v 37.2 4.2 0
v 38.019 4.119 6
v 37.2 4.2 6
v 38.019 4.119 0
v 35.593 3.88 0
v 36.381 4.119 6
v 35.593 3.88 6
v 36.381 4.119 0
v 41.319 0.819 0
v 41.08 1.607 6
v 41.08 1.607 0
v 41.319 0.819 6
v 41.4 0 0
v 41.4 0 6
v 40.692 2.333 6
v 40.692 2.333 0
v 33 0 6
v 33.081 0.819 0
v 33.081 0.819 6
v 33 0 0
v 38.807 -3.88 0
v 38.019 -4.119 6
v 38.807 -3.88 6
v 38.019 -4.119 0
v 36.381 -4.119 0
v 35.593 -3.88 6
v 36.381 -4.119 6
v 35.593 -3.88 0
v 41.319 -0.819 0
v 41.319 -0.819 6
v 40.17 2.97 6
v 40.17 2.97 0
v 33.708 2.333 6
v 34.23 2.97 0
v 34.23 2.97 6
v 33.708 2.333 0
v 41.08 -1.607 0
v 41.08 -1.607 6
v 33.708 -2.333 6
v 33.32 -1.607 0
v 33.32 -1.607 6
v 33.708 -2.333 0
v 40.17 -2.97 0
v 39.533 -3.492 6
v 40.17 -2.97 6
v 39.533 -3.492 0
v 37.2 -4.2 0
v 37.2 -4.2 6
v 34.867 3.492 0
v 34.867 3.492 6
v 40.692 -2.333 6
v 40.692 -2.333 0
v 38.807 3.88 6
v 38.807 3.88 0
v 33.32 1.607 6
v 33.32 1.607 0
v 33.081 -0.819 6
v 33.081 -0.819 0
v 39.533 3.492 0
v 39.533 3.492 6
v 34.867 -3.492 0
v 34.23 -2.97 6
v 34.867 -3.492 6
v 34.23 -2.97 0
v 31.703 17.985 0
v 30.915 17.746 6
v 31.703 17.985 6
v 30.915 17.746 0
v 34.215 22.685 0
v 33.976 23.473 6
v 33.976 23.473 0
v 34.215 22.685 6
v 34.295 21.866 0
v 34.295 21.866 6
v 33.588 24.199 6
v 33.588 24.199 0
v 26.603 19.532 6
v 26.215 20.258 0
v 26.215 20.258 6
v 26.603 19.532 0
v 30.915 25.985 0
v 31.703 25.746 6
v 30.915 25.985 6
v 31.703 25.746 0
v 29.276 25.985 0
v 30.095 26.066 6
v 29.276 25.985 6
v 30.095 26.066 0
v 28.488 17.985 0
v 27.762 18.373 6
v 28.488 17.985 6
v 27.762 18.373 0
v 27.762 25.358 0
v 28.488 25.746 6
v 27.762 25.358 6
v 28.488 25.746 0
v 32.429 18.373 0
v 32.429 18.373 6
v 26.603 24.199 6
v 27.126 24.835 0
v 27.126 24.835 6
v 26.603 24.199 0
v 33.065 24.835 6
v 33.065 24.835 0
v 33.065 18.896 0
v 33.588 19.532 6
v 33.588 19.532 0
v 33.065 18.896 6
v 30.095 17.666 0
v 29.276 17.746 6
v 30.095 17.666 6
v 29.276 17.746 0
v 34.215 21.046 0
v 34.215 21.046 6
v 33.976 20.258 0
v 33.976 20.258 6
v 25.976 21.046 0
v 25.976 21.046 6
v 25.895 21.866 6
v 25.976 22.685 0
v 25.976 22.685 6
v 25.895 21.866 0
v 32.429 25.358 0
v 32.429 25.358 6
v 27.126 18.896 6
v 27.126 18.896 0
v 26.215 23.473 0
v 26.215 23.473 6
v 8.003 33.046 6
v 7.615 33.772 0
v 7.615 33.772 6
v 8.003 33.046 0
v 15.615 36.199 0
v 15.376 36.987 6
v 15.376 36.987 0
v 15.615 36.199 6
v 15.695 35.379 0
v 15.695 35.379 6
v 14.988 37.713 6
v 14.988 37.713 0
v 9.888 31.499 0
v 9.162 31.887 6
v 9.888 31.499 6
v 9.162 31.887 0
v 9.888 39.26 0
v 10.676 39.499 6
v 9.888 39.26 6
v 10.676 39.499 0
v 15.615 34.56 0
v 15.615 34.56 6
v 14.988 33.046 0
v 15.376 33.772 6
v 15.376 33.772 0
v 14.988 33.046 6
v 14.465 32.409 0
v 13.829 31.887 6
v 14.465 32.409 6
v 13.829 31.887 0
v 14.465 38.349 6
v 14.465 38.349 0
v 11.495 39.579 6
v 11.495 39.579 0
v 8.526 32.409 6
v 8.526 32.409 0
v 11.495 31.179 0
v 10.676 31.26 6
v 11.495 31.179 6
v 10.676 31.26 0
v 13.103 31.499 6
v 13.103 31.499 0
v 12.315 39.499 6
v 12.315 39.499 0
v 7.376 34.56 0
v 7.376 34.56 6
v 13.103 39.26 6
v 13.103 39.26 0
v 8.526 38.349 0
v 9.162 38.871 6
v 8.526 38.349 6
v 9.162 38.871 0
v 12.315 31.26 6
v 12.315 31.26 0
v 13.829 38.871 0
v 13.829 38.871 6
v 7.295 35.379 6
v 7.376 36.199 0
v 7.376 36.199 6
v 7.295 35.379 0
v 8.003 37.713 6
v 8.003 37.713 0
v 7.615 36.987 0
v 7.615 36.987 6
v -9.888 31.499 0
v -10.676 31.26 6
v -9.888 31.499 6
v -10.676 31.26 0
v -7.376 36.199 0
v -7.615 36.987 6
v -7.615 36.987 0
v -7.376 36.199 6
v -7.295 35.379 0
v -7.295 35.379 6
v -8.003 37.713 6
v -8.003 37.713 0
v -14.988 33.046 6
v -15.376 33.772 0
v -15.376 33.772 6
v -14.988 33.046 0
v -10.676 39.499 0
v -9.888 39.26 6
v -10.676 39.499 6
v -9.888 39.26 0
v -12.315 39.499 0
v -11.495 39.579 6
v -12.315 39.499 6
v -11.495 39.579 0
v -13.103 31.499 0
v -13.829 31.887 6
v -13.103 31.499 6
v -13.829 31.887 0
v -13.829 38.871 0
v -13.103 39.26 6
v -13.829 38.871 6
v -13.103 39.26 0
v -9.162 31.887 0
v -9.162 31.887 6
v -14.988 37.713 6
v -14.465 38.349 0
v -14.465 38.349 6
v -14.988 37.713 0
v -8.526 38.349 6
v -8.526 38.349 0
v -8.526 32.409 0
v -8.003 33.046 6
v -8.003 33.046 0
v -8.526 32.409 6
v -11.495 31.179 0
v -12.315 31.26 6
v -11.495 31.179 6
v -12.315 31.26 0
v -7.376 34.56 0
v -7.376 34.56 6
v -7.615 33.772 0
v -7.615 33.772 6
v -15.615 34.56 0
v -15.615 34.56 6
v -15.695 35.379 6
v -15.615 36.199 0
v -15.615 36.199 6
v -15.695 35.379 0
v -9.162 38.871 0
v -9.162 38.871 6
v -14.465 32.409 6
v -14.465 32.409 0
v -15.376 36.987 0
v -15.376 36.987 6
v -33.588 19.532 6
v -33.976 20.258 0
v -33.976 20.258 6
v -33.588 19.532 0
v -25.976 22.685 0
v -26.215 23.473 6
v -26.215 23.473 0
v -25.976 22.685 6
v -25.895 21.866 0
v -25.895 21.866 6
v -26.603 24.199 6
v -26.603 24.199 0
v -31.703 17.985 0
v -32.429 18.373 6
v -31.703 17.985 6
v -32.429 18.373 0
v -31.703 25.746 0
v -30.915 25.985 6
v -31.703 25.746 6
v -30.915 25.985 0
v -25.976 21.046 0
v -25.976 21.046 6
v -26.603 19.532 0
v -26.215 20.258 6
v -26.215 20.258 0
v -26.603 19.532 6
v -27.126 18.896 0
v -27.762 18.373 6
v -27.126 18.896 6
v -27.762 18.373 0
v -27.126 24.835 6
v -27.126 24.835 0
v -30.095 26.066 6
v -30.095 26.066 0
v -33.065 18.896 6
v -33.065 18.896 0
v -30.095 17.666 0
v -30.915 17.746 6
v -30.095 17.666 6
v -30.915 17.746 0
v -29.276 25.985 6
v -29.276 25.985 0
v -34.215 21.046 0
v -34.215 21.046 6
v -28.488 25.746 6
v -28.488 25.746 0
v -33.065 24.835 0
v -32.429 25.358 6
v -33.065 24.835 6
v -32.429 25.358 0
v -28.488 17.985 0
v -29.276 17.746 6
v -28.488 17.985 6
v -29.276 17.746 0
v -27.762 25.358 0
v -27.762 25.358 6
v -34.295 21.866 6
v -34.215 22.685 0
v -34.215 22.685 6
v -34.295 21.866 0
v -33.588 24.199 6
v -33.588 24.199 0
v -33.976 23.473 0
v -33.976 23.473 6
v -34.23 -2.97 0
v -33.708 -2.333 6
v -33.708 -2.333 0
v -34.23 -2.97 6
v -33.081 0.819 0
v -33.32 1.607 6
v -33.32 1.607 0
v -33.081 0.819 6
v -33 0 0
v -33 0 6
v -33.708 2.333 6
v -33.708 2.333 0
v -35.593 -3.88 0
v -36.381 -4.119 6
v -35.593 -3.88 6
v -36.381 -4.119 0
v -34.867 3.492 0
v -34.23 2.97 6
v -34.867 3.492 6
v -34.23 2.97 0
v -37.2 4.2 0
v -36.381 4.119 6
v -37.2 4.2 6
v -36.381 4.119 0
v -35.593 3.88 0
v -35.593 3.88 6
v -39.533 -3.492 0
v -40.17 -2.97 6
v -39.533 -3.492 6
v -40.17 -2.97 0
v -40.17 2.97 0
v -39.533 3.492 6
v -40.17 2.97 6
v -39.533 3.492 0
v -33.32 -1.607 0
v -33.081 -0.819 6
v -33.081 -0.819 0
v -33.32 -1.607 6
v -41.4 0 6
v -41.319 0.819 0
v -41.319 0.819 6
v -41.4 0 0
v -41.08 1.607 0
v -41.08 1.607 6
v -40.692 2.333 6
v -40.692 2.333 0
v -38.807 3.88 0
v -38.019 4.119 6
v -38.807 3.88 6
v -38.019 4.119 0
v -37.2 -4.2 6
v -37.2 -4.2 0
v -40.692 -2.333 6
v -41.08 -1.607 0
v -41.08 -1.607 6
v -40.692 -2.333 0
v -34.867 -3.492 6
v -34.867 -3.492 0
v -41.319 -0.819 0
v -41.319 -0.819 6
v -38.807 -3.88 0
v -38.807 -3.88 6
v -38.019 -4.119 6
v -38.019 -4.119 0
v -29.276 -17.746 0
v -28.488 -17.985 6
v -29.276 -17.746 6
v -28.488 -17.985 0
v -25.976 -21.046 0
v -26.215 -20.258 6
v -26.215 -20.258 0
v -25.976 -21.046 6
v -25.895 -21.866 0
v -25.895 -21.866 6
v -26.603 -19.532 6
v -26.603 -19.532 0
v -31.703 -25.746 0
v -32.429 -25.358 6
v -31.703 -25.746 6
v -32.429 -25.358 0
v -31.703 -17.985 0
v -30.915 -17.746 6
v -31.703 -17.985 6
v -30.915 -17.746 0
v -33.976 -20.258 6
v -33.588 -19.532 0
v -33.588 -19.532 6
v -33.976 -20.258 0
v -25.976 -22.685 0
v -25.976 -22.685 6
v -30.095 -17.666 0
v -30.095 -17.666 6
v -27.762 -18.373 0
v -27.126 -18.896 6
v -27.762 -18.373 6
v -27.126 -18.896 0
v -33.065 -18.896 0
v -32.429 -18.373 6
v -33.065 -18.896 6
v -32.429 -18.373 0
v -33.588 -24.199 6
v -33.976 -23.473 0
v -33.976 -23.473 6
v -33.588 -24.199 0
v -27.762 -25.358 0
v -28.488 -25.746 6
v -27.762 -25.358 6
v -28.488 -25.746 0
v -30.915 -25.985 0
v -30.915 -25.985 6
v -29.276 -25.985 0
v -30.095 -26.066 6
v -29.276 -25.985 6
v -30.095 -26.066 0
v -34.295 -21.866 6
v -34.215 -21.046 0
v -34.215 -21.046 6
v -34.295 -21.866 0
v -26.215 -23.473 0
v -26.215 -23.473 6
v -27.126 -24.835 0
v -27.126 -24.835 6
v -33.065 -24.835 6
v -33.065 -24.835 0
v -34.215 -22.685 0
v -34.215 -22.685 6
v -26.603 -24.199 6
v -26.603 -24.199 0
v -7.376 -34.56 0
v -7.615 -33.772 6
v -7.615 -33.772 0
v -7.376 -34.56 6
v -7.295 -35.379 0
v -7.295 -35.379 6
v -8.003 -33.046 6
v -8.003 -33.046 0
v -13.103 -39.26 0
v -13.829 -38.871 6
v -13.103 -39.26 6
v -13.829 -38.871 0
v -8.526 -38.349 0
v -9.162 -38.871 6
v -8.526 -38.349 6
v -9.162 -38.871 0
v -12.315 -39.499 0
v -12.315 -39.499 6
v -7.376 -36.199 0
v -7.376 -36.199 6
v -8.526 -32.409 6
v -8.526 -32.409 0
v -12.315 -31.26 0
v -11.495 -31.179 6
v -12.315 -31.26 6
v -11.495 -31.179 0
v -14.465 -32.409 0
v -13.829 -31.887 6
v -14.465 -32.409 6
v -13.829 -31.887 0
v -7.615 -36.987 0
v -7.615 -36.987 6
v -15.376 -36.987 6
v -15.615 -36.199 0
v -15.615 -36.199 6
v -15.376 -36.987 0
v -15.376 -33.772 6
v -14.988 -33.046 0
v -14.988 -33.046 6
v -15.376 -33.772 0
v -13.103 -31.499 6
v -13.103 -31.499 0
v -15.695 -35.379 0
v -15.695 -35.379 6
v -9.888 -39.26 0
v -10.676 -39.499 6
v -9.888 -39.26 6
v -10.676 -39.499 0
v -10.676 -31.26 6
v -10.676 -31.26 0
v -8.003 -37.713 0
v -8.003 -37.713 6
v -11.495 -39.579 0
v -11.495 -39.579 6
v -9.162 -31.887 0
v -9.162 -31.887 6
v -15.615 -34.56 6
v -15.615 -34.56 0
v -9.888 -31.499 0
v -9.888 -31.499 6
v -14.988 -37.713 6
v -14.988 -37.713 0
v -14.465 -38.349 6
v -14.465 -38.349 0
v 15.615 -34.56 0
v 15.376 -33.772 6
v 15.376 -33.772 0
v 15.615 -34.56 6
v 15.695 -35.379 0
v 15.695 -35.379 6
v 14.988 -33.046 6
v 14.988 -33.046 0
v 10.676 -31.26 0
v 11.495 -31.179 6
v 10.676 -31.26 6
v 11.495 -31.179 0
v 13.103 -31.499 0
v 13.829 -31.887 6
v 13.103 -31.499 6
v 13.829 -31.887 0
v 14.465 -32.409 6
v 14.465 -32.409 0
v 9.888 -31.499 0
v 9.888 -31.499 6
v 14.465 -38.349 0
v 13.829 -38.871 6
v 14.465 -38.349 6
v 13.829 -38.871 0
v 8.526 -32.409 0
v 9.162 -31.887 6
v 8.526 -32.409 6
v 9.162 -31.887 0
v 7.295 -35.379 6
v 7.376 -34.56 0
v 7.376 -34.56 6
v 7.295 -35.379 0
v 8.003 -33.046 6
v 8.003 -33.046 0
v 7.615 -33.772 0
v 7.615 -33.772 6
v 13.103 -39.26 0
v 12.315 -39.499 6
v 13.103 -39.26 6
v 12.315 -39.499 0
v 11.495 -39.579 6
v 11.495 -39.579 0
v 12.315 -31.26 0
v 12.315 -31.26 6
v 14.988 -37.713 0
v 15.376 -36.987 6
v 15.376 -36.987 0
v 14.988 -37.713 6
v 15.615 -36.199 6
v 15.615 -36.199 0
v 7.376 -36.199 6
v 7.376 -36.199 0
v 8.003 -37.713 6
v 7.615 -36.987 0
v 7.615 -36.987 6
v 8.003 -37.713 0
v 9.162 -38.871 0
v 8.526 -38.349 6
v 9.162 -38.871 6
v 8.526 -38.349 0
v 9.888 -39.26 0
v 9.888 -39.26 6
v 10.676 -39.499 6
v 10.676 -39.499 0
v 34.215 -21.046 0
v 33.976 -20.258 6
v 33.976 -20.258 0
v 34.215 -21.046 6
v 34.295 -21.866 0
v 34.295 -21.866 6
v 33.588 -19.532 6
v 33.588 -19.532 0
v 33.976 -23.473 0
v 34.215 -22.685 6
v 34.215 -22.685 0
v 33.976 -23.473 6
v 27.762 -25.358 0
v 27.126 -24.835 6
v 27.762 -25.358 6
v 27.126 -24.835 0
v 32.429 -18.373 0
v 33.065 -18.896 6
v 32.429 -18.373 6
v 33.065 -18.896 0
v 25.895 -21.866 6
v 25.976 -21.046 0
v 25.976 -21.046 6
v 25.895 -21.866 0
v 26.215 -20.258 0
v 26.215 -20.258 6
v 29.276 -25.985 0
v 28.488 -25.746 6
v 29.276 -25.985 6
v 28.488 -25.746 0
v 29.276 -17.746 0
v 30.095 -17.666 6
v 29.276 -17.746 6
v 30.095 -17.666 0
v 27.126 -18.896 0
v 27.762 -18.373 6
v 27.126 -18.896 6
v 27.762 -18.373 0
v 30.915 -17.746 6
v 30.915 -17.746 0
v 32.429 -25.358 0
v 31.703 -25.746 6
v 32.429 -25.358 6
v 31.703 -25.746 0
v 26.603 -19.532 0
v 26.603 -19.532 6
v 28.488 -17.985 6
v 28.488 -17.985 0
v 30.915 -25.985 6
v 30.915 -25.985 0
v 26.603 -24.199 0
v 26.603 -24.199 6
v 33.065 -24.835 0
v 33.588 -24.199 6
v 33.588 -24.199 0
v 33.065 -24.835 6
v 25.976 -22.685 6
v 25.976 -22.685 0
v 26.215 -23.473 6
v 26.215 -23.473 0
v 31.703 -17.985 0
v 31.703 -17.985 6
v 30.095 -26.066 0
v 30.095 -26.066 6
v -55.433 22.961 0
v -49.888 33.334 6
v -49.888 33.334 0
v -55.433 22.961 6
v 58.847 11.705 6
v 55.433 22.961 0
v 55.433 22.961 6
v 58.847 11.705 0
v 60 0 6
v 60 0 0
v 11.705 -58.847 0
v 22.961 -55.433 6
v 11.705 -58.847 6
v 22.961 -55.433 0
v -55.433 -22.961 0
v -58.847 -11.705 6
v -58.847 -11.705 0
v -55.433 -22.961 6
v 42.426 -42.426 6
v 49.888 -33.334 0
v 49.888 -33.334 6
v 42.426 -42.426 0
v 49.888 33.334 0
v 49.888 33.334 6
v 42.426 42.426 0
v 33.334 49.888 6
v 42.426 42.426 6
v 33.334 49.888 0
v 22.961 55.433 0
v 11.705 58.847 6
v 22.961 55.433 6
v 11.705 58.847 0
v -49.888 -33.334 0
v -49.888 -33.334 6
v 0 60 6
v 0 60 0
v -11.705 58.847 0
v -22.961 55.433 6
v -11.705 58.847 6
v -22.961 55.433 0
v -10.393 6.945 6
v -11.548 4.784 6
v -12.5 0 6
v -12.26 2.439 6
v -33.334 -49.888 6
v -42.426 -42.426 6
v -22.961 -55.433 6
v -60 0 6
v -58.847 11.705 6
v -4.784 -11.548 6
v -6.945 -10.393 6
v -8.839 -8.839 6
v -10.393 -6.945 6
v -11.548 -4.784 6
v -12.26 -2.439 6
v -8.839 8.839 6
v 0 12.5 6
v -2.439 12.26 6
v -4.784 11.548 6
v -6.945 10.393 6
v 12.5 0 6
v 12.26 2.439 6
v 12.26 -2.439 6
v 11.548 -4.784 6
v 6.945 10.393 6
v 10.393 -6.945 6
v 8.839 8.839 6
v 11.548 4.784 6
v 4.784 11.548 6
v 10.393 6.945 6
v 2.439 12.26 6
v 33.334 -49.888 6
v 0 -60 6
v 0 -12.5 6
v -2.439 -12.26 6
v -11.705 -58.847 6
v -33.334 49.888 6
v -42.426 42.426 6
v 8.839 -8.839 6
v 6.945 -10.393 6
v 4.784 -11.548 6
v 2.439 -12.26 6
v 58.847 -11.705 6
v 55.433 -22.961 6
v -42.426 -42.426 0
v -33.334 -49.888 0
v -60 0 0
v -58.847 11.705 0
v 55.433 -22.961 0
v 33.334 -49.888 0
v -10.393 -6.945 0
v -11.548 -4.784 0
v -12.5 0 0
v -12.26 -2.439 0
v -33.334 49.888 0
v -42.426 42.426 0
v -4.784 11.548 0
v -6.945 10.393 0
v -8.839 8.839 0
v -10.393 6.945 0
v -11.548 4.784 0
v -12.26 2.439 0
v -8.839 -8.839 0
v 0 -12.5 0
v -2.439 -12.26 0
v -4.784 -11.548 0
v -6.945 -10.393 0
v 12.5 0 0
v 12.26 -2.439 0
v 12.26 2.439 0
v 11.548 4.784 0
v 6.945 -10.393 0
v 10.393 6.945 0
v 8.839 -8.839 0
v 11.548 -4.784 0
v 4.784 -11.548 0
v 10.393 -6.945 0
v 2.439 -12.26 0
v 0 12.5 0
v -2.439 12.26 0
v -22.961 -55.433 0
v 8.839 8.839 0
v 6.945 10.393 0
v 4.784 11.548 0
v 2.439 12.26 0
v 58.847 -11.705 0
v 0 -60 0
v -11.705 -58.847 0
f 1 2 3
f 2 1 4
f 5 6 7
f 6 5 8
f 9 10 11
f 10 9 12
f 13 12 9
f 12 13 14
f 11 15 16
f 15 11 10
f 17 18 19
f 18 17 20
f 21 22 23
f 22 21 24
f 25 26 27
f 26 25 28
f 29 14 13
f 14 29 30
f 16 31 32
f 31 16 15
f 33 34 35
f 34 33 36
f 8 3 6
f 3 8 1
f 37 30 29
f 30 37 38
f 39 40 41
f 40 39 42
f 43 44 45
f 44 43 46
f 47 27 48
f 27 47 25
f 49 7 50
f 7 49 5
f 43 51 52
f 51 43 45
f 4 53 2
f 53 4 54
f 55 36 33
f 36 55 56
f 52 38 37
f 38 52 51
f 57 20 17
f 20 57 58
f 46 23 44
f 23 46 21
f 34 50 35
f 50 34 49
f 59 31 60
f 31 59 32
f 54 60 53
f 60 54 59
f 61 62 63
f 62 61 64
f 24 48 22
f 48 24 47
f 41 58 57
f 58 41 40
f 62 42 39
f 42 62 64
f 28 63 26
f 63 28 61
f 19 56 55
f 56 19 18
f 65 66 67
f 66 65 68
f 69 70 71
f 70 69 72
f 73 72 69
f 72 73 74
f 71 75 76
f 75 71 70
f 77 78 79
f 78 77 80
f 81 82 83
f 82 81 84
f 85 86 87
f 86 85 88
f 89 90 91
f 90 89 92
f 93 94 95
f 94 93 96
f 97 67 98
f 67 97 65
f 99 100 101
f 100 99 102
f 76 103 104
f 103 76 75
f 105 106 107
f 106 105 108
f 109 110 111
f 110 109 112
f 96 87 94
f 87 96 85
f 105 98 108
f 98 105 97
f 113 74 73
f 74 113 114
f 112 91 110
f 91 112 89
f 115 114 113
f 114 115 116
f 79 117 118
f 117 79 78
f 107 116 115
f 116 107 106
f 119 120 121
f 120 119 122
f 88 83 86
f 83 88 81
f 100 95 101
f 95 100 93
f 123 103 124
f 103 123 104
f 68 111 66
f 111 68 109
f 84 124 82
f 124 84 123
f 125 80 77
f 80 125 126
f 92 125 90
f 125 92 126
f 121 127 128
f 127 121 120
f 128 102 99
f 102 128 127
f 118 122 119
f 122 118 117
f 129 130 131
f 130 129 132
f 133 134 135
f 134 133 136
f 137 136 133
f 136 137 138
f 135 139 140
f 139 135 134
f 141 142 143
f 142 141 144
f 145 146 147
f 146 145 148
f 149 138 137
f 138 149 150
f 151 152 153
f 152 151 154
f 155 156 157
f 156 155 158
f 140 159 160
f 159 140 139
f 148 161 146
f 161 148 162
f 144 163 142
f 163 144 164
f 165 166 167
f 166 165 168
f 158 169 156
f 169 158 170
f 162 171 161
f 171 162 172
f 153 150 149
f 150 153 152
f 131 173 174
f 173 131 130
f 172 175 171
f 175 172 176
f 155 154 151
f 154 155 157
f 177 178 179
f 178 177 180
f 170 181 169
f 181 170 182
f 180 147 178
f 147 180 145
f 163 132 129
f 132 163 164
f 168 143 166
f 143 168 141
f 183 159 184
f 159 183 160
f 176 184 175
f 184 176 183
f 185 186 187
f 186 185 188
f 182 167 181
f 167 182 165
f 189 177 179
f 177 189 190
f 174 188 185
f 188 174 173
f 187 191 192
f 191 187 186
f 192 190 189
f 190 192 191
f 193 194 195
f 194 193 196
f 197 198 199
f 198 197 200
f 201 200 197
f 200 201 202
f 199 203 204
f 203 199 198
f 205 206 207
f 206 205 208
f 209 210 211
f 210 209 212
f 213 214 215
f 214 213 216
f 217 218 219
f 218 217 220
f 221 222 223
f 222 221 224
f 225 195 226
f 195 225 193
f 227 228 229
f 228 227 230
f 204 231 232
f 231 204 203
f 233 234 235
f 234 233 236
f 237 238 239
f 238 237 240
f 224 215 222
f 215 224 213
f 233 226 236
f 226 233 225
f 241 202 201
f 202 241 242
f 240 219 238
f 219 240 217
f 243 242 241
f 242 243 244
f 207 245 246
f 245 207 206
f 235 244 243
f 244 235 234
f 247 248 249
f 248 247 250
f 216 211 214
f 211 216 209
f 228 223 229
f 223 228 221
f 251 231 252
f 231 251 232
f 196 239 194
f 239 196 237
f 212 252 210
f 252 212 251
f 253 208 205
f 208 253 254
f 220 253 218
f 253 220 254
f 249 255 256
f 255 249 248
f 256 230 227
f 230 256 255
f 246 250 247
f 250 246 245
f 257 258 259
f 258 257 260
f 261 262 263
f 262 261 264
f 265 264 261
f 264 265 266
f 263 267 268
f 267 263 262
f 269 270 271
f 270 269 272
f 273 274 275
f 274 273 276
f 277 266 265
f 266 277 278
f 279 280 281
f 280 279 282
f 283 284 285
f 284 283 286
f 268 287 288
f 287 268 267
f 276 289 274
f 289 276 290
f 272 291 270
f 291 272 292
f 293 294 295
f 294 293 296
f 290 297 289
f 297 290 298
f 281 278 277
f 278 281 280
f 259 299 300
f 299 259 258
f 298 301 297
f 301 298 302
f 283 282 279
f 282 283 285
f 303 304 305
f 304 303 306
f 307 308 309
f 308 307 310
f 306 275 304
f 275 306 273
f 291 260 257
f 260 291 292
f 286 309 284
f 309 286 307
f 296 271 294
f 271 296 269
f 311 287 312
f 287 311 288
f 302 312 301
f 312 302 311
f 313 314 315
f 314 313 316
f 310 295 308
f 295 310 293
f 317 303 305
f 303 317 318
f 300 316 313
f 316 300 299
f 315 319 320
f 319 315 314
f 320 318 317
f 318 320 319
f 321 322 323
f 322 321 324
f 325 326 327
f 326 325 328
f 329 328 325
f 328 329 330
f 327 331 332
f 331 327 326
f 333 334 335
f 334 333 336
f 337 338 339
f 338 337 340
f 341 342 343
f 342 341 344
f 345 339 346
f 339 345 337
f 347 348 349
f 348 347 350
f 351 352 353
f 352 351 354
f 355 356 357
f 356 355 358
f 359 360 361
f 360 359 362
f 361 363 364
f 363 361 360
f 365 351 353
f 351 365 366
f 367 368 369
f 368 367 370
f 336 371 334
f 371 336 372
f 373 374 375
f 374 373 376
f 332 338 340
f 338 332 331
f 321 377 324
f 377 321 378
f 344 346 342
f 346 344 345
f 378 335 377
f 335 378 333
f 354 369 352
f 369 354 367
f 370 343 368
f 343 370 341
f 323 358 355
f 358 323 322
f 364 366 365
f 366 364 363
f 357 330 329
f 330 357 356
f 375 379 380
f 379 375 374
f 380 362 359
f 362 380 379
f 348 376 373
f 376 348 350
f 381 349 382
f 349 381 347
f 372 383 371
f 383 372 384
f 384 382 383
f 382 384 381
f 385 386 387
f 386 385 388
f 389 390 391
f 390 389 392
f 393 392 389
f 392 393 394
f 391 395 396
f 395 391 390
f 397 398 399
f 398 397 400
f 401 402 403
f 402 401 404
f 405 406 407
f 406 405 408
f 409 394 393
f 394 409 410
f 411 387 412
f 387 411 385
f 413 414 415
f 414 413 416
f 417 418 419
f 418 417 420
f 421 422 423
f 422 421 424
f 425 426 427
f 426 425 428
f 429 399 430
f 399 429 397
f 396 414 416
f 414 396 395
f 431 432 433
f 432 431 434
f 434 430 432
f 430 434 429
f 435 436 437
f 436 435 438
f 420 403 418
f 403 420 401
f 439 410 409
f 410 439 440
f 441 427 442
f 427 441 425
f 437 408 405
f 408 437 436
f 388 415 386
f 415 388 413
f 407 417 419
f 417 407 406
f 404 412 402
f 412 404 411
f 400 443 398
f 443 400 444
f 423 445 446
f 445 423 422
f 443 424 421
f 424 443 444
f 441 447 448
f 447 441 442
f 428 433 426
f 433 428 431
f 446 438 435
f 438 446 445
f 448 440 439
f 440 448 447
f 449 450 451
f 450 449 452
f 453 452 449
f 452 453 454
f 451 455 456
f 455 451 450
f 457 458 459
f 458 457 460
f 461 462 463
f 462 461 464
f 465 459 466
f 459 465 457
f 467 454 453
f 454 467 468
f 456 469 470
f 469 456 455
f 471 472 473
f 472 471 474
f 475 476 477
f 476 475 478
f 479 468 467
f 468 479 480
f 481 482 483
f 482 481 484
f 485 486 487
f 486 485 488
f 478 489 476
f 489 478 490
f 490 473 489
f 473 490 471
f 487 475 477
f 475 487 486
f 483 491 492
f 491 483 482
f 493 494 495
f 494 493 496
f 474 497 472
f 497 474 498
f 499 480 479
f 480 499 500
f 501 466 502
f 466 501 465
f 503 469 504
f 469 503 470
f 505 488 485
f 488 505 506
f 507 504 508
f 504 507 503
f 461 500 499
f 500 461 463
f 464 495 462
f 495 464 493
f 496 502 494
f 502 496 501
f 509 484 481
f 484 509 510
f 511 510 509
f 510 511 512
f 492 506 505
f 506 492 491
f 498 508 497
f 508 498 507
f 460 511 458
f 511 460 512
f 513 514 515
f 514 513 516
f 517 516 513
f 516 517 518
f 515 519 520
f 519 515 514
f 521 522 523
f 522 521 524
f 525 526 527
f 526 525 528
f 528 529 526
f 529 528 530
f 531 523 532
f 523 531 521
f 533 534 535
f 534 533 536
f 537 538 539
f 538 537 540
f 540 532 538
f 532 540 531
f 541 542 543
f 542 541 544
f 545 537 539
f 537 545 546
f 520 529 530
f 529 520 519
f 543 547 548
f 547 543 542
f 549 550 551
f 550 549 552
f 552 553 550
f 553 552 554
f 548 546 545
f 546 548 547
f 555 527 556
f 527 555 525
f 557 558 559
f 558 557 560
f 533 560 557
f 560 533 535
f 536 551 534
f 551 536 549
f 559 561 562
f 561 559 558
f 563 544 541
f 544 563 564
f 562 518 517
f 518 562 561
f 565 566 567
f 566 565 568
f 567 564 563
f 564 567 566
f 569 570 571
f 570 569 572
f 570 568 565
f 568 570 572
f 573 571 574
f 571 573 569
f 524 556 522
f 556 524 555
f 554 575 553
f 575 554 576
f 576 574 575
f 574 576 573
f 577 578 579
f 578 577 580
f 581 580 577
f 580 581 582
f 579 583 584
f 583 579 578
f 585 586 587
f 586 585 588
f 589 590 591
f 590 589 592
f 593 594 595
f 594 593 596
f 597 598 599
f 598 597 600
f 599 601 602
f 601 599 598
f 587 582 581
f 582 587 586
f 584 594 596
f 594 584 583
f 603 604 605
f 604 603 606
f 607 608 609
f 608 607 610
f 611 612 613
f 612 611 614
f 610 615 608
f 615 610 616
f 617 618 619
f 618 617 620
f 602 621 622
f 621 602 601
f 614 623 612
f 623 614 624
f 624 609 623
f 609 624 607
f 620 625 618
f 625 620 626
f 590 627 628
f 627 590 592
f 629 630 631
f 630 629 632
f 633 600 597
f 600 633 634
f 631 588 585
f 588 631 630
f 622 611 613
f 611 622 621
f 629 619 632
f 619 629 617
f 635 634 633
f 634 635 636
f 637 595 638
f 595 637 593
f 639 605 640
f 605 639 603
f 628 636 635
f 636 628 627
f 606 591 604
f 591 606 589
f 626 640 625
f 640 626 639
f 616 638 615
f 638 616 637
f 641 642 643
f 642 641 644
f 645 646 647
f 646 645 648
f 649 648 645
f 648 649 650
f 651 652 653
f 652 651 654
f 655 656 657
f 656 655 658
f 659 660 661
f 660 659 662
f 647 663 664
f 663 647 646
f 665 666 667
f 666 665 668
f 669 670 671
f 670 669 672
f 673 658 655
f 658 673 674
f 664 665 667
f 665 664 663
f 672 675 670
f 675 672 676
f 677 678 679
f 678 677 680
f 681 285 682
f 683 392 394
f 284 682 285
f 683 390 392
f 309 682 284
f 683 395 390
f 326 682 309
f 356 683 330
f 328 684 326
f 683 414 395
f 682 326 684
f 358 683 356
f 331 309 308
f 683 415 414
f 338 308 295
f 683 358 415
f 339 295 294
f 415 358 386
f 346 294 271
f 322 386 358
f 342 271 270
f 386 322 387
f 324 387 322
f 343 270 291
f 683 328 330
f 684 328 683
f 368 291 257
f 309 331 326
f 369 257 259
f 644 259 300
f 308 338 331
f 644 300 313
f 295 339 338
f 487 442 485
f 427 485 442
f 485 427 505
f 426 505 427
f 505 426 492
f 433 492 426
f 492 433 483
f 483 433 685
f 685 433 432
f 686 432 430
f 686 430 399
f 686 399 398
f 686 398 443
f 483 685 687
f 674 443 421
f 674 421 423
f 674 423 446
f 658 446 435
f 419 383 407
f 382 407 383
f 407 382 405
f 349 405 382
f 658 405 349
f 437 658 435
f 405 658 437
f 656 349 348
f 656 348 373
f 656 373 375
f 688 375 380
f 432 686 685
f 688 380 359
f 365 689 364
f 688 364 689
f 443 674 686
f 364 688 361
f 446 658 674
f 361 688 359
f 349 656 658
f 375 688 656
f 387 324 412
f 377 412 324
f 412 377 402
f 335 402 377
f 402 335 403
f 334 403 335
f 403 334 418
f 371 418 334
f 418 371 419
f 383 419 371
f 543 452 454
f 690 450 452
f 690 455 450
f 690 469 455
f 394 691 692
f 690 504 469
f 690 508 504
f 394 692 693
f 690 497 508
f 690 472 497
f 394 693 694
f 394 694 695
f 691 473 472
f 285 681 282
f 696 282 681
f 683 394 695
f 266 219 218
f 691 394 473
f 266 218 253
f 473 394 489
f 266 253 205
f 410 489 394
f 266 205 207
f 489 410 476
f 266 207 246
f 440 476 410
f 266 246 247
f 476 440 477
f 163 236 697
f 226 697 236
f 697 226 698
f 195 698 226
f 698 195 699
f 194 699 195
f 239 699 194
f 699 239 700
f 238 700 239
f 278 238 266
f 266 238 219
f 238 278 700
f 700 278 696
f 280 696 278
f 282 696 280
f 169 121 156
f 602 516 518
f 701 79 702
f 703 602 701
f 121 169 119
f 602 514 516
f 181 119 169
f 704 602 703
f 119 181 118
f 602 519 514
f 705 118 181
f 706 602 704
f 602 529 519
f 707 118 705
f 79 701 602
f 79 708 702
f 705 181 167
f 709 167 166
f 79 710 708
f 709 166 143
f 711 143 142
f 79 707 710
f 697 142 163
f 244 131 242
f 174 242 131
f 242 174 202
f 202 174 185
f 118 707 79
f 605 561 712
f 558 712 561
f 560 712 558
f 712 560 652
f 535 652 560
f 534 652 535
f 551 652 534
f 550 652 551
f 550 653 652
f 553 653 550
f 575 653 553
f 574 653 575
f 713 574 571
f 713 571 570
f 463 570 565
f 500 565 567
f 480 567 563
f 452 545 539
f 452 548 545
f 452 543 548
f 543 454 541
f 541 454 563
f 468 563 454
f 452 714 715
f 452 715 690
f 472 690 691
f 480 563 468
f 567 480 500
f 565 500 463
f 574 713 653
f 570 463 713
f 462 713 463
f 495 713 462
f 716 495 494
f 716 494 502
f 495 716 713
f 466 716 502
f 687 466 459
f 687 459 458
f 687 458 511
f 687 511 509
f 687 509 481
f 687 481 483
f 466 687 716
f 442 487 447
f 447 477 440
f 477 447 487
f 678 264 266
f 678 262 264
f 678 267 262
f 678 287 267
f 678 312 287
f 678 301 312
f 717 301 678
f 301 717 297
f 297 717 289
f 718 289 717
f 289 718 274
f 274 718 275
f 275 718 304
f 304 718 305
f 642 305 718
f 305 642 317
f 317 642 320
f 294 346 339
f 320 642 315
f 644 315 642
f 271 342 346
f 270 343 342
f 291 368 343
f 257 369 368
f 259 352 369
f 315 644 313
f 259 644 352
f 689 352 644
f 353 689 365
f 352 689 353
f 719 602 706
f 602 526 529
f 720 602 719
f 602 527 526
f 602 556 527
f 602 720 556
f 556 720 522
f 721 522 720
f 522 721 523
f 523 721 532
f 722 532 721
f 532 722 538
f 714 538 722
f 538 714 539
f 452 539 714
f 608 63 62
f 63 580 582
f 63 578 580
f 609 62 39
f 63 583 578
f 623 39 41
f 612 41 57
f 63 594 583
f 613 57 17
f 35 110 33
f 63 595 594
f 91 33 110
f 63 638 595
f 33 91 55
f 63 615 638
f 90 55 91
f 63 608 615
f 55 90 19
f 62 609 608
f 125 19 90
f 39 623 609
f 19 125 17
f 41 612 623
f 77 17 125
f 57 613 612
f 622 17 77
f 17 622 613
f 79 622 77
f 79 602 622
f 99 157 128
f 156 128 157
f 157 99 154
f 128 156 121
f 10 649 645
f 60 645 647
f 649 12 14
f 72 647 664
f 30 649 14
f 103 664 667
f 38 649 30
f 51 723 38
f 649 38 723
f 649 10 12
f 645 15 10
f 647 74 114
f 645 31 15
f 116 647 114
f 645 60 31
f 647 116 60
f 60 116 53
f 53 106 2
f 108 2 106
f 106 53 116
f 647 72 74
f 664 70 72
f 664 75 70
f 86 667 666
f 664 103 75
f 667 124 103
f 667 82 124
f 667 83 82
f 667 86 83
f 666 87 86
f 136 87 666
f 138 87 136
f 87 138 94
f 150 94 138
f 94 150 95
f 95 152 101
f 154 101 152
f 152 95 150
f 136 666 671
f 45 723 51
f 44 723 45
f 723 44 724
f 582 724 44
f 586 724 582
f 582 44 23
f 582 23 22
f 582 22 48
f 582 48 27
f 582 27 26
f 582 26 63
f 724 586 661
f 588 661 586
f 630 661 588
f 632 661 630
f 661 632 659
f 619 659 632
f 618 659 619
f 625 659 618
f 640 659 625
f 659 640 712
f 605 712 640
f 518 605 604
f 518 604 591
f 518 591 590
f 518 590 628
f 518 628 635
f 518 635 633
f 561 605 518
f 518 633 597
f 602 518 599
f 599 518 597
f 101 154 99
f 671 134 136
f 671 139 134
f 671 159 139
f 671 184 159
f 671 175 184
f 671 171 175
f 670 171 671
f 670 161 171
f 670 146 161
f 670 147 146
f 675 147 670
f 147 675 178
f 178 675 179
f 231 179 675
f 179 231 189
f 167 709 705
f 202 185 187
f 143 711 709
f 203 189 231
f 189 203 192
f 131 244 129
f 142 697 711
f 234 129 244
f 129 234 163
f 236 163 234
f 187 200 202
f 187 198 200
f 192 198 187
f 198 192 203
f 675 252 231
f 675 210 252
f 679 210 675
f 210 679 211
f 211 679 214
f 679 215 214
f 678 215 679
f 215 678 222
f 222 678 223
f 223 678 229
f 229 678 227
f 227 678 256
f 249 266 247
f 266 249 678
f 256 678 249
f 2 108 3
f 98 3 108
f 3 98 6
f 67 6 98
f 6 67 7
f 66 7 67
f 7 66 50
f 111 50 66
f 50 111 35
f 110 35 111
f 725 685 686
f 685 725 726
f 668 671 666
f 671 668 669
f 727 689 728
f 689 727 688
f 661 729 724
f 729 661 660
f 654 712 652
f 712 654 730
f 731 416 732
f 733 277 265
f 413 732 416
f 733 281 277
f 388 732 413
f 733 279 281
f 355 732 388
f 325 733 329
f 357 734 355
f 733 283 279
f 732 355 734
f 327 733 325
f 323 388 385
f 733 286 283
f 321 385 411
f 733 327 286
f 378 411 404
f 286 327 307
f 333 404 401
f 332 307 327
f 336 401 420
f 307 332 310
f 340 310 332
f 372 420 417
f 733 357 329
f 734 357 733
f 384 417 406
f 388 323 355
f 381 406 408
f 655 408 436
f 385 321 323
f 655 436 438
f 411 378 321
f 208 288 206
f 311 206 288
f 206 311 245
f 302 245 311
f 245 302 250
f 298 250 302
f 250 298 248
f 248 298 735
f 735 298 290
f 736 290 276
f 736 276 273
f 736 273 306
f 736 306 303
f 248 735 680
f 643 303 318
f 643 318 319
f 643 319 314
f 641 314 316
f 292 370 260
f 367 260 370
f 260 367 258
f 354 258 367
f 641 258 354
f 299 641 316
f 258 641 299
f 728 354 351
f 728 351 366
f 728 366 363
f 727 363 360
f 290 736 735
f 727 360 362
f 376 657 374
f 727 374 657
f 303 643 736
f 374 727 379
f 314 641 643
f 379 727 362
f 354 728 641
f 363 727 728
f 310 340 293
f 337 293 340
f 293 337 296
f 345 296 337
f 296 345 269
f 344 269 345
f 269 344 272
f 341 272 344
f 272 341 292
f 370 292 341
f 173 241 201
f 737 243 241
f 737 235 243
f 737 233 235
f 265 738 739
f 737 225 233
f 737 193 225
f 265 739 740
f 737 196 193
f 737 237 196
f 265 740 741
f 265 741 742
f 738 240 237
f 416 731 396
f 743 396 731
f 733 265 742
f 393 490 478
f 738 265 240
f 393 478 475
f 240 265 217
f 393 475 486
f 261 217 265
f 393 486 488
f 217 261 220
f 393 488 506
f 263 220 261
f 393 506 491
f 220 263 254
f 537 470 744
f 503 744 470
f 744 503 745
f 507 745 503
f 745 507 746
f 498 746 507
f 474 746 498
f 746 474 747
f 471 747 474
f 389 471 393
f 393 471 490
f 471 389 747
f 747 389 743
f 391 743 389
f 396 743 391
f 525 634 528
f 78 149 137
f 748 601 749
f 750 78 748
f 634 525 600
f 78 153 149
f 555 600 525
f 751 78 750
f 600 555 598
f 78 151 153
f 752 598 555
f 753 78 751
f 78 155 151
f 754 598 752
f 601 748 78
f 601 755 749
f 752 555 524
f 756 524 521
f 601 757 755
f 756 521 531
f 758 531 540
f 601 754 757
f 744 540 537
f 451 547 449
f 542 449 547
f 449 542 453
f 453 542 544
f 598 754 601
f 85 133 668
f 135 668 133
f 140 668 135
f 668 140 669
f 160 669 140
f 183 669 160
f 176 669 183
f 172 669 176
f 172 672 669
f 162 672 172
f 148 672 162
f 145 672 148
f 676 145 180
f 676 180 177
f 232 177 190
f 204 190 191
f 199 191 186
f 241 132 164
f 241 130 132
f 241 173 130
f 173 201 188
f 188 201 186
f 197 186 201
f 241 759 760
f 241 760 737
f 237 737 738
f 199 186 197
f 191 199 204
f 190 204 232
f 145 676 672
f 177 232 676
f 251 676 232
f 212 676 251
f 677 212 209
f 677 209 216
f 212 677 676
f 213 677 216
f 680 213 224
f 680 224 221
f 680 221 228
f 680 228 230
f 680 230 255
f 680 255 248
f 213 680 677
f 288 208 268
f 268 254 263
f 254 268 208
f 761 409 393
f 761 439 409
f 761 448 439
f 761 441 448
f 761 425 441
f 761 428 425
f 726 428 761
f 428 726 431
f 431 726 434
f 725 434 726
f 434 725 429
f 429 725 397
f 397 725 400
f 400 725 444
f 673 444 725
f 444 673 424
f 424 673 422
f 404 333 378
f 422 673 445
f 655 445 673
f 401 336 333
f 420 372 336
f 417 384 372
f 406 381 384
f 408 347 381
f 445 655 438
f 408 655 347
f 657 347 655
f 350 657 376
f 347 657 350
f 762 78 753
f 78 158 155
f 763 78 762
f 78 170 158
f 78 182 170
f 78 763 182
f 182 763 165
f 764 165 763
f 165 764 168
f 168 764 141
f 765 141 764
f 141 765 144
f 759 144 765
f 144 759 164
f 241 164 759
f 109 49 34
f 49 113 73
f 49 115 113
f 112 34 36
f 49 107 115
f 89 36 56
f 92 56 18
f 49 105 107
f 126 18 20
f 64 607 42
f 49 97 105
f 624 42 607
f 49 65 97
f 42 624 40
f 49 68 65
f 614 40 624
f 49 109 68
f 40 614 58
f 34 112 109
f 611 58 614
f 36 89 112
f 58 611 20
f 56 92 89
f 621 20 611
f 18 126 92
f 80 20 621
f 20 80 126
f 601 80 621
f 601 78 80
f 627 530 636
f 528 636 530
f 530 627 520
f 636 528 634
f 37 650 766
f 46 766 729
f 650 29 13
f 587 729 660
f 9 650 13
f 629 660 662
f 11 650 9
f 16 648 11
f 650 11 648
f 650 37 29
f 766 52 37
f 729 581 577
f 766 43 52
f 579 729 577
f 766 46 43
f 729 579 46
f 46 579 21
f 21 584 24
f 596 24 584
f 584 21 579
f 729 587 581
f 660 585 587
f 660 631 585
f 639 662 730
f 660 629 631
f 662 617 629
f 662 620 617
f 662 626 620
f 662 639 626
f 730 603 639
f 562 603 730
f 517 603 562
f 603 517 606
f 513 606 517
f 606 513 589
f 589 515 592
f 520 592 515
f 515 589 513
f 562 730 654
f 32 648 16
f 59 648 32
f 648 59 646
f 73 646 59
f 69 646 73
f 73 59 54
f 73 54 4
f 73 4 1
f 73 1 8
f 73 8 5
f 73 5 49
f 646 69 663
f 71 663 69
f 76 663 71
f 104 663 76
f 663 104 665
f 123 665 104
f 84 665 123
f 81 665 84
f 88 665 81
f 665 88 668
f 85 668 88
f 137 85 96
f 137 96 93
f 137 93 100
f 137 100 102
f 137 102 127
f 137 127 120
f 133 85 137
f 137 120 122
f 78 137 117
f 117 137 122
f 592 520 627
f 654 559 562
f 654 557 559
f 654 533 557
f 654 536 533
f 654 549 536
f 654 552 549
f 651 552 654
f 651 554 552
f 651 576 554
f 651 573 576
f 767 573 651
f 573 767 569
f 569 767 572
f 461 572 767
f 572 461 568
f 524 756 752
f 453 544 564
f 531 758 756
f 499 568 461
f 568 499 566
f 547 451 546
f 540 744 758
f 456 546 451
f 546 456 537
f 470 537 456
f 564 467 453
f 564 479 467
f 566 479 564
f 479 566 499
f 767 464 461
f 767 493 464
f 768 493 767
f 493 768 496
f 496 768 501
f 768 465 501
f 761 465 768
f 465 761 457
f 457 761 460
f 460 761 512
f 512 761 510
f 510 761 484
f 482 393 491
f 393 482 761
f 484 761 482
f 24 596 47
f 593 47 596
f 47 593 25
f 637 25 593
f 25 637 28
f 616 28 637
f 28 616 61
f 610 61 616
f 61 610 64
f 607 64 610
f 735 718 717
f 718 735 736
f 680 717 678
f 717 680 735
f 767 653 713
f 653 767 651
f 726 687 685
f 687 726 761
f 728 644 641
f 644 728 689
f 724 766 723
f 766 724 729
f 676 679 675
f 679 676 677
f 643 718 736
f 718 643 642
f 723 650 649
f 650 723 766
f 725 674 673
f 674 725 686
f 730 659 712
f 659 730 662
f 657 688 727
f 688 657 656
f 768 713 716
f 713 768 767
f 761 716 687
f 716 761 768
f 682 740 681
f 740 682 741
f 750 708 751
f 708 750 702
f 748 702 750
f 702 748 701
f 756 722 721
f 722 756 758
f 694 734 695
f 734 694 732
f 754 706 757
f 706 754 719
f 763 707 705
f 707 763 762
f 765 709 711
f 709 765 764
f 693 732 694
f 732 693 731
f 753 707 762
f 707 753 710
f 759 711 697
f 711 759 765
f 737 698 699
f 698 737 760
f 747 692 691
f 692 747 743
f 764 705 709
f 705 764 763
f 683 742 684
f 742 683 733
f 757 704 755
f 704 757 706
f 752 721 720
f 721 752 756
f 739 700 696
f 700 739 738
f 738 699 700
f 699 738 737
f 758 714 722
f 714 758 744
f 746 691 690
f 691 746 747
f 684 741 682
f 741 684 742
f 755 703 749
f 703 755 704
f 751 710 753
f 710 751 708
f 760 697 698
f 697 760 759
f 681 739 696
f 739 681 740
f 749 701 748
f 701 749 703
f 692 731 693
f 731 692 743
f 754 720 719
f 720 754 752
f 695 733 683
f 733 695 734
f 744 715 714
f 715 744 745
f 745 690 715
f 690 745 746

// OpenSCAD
$fn = 32;

// ----------------------------------------------------------------------
// Flange Ø120 x 6
// 10 holes on a Ø74.4 bolt circle, bolted joints
// ----------------------------------------------------------------------

// --- parameters (mm) ---
flange_d = 120;  // outside diameter of the flange
thickness = 6;   // flange thickness
holes = 10;      // number of bolt holes
pcd = 74.4;      // bolt circle diameter
start_deg = 0;   // angle of the first hole, from +X
hole_d = 8.4;    // bolt hole diameter
bore_d = 25;     // central through bore
hub_d = 33;      // hub outside diameter
hub_h = 0;       // hub height above the flange face (0 = no hub)

// --- derived feature positions (mm) ---
height = thickness + hub_h;  // = 6   overall height of the part
pcd_r = pcd / 2;             // = 37.2   bolt circle radius
hole_step = 360 / holes;     // = 36   angular pitch
feature_centers = [
  [pcd_r * cos(start_deg + 0 * hole_step), pcd_r * sin(start_deg + 0 * hole_step)],
  [pcd_r * cos(start_deg + 1 * hole_step), pcd_r * sin(start_deg + 1 * hole_step)],
  [pcd_r * cos(start_deg + 2 * hole_step), pcd_r * sin(start_deg + 2 * hole_step)],
  [pcd_r * cos(start_deg + 3 * hole_step), pcd_r * sin(start_deg + 3 * hole_step)],
  [pcd_r * cos(start_deg + 4 * hole_step), pcd_r * sin(start_deg + 4 * hole_step)],
  [pcd_r * cos(start_deg + 5 * hole_step), pcd_r * sin(start_deg + 5 * hole_step)],
  [pcd_r * cos(start_deg + 6 * hole_step), pcd_r * sin(start_deg + 6 * hole_step)],
  [pcd_r * cos(start_deg + 7 * hole_step), pcd_r * sin(start_deg + 7 * hole_step)],
  [pcd_r * cos(start_deg + 8 * hole_step), pcd_r * sin(start_deg + 8 * hole_step)],
  [pcd_r * cos(start_deg + 9 * hole_step), pcd_r * sin(start_deg + 9 * hole_step)]
];   // bolt hole centres on the pitch circle

// flange disc, every hole and the bore cut straight through
difference() {
  union() {
    cylinder(d = flange_d, h = thickness);
  }
  translate([0, 0, -1]) cylinder(d = bore_d, h = height + 2);  // bore, through
  for (centre = feature_centers)
    translate([centre[0], centre[1], -1]) cylinder(d = hole_d, h = thickness + 2);
}
